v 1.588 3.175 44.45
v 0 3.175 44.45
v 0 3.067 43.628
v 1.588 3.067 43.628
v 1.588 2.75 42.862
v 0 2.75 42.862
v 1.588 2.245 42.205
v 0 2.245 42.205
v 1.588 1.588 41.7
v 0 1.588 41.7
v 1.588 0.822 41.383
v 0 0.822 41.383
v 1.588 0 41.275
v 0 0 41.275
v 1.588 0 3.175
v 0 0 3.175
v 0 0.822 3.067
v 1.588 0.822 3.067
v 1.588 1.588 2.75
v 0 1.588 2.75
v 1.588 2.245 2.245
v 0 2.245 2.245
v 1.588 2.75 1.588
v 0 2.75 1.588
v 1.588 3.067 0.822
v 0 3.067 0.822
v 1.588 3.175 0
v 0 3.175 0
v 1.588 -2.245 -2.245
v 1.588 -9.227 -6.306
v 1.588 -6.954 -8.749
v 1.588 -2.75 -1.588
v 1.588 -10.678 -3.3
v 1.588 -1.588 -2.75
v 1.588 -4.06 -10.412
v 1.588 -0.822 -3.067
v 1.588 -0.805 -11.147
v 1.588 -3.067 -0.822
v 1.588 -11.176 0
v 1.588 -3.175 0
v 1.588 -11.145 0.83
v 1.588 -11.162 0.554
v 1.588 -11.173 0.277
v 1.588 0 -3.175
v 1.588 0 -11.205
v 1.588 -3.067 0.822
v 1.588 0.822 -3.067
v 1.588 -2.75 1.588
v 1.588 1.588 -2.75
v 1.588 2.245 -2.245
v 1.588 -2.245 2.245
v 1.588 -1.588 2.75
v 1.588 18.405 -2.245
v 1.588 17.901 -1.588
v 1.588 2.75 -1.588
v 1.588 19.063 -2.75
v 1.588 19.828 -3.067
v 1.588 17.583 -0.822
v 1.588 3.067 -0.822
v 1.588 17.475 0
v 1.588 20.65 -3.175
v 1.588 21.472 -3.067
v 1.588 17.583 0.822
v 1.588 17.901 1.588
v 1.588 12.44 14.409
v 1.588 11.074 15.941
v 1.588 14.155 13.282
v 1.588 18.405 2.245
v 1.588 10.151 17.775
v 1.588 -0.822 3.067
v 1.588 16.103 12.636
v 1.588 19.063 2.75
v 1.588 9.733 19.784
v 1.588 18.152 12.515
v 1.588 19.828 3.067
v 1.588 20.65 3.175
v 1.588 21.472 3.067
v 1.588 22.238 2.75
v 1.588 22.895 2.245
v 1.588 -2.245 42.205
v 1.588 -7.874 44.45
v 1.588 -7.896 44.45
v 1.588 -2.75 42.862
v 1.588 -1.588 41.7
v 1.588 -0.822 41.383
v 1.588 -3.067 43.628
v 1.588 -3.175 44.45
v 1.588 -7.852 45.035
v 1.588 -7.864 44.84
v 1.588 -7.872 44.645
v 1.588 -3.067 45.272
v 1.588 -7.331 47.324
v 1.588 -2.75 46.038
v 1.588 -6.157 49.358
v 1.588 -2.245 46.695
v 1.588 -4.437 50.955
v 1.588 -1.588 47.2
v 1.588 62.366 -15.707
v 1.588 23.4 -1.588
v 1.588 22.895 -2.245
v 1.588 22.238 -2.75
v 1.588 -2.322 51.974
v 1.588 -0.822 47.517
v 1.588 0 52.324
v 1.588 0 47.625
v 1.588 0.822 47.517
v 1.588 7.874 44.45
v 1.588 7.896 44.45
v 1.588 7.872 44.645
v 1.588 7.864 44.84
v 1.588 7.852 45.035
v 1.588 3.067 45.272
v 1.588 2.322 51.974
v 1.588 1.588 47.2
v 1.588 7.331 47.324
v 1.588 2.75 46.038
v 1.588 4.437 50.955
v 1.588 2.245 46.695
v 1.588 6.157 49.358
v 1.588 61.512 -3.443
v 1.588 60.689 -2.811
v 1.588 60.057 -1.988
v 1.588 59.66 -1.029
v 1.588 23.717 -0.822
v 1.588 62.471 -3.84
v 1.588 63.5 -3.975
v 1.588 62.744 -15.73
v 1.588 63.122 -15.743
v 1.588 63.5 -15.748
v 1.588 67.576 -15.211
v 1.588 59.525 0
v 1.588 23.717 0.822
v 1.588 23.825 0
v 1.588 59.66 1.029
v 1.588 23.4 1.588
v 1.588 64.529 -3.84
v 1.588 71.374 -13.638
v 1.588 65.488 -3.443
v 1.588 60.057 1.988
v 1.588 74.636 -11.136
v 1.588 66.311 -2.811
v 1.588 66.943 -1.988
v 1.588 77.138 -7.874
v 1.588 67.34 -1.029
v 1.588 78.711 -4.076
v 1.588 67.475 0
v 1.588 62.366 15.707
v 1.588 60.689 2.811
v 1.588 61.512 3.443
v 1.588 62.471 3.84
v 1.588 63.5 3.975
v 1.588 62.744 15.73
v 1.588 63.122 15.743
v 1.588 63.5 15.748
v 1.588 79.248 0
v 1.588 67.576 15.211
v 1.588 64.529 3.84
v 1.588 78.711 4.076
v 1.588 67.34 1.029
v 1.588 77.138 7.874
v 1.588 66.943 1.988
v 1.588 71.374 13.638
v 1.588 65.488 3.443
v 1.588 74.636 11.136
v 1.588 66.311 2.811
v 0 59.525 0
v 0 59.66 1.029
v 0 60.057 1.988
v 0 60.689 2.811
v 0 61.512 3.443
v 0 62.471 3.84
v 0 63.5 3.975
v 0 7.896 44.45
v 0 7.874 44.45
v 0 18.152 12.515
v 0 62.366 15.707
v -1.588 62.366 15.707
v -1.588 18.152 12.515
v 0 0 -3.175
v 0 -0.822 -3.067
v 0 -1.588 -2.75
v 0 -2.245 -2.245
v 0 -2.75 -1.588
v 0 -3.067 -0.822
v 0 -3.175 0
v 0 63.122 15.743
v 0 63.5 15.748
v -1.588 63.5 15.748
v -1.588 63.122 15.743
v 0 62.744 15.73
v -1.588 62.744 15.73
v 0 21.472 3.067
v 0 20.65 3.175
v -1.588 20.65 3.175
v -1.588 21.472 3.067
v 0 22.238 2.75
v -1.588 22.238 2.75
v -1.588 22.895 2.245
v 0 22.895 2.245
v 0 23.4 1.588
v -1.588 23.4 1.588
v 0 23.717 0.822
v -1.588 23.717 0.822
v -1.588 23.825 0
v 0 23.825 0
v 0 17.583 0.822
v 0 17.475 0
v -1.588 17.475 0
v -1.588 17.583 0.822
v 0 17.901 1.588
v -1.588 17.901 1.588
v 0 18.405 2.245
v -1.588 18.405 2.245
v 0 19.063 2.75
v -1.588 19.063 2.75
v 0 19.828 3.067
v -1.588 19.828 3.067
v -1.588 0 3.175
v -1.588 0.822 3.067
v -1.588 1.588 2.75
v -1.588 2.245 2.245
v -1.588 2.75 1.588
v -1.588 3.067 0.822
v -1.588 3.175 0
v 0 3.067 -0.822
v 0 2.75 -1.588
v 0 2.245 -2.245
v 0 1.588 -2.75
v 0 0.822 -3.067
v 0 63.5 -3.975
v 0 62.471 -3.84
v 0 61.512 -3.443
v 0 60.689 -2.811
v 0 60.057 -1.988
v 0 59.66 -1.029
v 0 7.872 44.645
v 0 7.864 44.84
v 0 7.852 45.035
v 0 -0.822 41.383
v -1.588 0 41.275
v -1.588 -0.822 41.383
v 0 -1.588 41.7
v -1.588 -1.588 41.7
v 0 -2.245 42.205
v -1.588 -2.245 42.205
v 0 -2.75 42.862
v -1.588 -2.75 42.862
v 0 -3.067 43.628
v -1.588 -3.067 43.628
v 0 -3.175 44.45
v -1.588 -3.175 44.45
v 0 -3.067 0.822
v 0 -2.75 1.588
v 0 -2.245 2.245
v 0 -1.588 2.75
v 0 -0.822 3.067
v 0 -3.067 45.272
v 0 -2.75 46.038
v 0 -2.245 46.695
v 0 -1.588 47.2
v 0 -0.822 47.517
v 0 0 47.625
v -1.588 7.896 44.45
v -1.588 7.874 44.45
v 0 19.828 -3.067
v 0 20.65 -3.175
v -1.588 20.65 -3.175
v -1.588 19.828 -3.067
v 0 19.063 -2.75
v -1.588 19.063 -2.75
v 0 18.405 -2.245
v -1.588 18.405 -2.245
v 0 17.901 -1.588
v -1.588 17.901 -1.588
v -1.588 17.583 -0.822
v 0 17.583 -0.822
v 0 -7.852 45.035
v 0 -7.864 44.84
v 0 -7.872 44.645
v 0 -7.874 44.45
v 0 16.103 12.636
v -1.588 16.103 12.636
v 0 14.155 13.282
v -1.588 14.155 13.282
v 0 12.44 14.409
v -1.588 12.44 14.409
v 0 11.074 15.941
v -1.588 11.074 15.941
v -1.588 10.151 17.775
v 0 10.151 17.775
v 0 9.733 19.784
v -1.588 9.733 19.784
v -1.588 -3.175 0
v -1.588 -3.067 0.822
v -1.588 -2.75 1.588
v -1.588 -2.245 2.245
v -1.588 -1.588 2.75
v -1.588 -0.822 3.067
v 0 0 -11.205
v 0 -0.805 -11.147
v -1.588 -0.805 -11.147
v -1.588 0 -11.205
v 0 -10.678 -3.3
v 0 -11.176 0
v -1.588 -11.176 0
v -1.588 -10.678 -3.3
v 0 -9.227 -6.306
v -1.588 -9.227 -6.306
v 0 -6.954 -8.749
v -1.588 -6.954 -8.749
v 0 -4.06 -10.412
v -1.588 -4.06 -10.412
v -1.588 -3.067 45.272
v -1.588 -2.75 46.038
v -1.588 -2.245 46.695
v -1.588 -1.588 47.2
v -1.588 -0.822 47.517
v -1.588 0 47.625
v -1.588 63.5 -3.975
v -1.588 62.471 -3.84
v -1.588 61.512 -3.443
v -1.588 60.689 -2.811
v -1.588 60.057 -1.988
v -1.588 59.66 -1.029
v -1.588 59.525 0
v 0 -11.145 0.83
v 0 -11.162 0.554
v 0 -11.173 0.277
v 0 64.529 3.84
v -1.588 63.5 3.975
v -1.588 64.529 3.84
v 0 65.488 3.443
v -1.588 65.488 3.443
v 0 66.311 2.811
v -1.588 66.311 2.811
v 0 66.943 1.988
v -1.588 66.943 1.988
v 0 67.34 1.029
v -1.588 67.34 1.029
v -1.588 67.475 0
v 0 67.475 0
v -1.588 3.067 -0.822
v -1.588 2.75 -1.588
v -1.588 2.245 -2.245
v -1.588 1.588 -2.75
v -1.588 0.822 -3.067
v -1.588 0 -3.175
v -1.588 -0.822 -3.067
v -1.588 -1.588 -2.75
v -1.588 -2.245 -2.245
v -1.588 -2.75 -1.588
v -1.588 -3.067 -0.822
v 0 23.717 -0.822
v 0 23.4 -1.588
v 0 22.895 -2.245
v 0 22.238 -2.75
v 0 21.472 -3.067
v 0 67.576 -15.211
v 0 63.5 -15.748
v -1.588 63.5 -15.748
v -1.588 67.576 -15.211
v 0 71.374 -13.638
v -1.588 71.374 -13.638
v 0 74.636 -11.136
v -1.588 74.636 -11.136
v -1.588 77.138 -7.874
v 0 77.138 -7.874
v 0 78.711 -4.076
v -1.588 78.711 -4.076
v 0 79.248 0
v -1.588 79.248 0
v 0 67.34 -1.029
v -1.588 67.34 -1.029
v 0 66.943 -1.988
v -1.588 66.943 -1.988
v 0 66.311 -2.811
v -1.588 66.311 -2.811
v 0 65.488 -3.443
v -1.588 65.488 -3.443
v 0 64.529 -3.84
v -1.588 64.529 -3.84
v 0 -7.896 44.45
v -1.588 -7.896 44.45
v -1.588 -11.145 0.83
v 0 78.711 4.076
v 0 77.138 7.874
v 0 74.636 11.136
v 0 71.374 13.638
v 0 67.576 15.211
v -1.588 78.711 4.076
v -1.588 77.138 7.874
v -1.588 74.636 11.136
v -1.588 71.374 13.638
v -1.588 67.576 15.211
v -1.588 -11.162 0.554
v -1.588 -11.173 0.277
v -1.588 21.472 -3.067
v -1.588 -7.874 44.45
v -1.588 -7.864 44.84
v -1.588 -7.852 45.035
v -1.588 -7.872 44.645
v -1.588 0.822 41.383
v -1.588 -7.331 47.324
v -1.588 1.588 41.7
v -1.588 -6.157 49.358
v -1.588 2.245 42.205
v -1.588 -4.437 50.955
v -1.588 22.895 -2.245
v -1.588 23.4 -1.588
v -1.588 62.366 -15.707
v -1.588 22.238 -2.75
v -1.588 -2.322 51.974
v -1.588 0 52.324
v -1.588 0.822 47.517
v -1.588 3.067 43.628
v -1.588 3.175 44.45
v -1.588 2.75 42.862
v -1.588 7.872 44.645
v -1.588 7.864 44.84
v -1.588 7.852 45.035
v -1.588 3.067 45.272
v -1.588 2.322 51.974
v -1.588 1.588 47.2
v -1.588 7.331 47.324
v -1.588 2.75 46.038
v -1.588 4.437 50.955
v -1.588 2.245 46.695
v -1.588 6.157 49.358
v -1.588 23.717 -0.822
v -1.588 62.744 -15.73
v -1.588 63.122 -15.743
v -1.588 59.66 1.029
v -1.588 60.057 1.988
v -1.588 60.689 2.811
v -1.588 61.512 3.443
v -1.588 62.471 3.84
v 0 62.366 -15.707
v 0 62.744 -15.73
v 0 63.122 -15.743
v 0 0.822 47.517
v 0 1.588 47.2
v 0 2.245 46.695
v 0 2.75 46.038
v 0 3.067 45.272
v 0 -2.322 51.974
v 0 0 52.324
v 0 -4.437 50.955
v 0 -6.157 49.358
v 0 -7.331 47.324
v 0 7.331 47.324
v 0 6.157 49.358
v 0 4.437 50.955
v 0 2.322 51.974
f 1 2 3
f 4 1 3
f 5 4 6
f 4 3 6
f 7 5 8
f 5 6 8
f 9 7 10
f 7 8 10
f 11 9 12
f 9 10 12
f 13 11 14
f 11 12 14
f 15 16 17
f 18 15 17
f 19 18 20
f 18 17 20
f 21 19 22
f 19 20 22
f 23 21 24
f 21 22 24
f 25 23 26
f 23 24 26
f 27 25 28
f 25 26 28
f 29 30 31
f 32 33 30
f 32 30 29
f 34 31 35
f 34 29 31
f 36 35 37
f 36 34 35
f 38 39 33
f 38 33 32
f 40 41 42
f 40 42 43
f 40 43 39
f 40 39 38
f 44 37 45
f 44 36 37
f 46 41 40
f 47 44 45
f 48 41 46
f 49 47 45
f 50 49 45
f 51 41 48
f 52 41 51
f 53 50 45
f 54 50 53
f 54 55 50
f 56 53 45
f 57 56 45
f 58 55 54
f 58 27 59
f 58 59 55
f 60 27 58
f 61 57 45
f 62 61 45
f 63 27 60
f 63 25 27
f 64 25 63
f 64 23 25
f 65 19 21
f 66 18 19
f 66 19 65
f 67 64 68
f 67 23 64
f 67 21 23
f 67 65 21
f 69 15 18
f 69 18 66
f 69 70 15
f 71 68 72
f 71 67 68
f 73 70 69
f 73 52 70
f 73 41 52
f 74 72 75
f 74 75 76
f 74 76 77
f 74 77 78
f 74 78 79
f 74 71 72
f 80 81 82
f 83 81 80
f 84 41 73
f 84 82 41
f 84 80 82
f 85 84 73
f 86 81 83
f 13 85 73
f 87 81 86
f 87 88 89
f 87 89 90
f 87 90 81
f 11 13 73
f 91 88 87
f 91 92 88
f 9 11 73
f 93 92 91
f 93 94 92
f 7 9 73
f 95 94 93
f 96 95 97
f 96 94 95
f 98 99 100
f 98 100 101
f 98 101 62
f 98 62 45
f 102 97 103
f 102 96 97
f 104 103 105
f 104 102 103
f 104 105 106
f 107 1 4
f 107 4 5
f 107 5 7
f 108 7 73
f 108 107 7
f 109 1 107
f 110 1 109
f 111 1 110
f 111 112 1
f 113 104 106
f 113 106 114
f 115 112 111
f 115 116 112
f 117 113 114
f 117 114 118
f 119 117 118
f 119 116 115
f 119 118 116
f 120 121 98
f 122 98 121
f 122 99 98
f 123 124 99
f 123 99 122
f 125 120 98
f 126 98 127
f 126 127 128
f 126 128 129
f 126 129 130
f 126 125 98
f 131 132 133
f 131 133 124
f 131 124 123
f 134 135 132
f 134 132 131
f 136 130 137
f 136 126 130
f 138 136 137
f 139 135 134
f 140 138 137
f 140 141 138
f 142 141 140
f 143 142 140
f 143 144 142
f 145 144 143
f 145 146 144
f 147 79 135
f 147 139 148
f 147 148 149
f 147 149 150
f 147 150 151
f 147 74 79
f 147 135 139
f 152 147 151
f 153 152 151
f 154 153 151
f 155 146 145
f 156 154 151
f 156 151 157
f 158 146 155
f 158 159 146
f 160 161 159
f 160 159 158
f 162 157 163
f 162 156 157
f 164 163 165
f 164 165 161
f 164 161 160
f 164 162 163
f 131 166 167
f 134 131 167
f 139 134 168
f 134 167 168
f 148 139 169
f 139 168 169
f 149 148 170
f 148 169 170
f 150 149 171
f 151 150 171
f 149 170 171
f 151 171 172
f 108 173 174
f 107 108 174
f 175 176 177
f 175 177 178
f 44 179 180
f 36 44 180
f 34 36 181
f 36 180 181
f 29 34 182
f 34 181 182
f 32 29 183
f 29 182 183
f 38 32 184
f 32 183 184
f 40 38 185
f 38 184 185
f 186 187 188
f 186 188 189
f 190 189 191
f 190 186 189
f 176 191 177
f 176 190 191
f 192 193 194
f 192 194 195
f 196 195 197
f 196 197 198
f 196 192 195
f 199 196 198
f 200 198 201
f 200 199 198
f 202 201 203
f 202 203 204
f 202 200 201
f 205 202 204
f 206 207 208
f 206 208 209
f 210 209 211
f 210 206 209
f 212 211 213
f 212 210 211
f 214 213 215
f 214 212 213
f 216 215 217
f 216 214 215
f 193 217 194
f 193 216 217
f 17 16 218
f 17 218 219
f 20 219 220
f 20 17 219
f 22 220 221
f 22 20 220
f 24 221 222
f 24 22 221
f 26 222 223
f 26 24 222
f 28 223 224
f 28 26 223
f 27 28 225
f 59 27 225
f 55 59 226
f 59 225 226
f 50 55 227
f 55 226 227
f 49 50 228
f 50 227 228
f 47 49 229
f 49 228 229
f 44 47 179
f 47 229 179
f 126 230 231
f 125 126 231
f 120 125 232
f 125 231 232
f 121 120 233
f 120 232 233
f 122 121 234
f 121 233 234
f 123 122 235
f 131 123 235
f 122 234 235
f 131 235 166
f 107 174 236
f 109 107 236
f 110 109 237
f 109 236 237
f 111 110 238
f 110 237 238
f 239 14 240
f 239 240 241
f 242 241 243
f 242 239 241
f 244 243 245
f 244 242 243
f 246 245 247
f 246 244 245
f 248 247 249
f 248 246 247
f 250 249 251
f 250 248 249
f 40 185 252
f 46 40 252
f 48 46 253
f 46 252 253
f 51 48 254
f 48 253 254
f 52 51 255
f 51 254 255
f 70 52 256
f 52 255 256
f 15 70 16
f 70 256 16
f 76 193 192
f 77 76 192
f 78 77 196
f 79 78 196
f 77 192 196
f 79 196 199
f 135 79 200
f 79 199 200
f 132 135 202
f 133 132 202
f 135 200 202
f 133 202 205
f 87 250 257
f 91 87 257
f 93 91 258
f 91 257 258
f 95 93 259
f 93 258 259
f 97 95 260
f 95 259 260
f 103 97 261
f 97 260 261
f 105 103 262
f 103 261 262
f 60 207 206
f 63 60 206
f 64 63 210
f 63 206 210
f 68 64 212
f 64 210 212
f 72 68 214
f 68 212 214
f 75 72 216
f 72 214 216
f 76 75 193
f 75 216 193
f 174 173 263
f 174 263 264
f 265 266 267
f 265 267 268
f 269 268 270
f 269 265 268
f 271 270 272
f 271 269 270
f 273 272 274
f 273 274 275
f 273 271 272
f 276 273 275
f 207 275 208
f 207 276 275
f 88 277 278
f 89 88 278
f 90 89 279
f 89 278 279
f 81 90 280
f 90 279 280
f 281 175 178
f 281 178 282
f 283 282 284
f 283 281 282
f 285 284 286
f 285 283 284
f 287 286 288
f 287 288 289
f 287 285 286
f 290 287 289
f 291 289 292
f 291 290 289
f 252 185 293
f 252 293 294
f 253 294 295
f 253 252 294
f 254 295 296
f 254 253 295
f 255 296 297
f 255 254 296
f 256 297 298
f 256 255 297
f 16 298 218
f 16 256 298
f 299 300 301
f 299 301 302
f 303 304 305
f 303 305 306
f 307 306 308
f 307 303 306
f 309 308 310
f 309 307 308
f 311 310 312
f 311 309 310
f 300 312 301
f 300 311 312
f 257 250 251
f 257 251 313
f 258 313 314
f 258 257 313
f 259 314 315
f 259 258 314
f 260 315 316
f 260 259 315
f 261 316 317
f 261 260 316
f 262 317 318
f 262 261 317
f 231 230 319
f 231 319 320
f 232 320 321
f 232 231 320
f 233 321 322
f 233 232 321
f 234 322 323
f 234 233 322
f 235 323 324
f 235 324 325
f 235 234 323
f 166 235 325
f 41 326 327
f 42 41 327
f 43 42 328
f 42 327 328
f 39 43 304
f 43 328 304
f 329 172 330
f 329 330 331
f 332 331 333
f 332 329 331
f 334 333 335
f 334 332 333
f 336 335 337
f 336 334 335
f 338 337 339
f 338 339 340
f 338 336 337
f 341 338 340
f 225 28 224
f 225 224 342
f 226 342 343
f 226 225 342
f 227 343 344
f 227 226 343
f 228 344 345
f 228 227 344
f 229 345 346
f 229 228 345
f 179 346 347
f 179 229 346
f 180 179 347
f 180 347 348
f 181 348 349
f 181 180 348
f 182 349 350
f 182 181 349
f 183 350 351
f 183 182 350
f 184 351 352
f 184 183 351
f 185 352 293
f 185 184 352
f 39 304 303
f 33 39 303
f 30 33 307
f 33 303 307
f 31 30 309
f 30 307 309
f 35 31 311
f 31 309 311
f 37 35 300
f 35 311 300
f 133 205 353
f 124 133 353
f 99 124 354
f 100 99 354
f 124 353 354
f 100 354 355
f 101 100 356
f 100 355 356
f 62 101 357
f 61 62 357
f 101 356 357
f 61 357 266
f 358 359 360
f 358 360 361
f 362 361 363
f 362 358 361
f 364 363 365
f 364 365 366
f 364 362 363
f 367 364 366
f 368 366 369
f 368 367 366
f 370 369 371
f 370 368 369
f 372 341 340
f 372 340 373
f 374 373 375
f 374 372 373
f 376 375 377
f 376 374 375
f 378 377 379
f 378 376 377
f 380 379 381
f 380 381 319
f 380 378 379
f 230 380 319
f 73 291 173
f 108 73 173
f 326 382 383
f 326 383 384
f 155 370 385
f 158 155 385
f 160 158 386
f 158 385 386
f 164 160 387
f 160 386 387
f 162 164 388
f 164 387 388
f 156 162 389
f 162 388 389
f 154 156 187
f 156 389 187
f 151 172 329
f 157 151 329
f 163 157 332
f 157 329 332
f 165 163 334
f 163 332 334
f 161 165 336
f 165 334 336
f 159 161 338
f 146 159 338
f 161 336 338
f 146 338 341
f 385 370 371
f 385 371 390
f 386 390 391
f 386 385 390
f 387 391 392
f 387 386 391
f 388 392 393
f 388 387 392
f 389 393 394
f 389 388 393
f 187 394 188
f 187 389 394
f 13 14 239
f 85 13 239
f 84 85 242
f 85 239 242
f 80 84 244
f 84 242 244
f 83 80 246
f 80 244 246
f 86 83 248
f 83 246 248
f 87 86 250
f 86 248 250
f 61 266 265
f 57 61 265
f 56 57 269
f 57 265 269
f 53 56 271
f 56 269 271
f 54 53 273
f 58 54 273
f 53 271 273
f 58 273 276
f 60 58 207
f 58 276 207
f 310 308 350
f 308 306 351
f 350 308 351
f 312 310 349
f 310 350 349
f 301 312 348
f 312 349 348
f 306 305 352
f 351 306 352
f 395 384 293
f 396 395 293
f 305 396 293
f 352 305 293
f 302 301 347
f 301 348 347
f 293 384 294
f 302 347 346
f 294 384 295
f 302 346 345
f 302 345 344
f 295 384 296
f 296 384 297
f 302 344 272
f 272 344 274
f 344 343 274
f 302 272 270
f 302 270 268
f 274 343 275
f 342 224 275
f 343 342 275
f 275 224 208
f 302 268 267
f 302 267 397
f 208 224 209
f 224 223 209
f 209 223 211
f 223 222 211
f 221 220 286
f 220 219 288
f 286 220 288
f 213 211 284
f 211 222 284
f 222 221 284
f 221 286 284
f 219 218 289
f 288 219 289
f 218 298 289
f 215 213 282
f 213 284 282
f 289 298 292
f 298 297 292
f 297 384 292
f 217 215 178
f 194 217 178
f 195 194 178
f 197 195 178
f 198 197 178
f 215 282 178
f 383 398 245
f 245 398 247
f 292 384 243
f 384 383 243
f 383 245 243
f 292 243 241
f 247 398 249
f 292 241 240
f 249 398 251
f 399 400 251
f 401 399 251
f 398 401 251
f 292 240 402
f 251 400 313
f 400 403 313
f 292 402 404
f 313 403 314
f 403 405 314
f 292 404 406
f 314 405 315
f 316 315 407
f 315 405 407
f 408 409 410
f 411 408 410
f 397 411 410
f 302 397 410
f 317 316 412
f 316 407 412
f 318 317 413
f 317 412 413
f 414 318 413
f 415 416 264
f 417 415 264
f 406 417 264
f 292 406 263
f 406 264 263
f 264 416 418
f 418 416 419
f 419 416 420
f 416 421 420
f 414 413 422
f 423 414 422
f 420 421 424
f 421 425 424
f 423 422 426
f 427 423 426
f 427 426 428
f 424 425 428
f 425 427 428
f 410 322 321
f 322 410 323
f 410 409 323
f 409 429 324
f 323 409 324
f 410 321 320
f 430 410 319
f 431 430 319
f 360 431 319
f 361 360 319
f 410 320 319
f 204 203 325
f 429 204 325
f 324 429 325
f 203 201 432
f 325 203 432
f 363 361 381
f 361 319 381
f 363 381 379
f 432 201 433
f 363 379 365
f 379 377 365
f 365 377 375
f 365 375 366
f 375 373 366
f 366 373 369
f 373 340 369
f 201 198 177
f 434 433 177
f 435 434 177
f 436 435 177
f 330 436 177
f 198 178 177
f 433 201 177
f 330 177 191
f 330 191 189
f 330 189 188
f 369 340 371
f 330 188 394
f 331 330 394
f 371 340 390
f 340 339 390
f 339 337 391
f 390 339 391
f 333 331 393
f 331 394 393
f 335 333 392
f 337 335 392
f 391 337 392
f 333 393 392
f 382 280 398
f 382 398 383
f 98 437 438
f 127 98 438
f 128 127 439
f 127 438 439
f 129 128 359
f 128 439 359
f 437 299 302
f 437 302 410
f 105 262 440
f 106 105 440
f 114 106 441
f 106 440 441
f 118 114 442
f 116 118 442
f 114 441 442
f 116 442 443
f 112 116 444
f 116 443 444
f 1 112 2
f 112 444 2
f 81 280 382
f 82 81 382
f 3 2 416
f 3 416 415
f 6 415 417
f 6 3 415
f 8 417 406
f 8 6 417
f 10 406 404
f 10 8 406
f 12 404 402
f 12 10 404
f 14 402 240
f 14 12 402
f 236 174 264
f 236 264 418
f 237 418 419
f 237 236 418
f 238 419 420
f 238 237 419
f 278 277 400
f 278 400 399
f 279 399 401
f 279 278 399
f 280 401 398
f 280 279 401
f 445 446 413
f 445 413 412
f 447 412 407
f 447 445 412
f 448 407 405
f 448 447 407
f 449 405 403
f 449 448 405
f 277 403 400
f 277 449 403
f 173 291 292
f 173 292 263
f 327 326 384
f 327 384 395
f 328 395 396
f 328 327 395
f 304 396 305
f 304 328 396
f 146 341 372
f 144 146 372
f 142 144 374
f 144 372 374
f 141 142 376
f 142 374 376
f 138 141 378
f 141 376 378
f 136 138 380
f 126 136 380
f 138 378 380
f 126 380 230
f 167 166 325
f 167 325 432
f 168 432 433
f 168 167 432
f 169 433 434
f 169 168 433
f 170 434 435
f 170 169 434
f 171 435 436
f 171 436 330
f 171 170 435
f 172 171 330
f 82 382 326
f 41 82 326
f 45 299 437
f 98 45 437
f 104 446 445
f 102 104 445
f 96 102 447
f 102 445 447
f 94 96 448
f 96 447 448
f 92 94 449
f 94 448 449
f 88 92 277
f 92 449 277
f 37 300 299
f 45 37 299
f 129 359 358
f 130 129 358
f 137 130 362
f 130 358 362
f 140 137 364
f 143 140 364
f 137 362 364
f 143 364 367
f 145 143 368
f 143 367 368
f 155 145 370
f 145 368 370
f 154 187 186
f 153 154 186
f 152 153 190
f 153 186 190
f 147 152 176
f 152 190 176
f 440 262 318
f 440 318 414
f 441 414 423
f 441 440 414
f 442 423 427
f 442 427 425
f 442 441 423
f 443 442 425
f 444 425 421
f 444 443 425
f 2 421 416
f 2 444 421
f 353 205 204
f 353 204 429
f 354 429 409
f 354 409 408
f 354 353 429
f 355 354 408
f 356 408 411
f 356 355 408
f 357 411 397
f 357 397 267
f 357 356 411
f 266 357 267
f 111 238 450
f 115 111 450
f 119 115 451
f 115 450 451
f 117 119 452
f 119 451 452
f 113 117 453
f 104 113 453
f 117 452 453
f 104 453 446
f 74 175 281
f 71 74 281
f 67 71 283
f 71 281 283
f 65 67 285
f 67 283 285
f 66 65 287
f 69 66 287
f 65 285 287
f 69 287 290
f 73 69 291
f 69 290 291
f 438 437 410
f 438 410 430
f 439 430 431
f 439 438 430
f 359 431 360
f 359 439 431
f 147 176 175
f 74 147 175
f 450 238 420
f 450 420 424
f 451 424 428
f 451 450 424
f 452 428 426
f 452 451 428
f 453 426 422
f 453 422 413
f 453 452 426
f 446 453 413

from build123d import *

# Parameters (mm, degrees)
F1_DEPTH = 1.5875


with BuildPart() as f1:
    # F0 (on Right) → F1 (new body, symmetric)
    with BuildSketch(Plane.YZ):
        with BuildLine():
            Line((0, 41.275), (0, 3.175))
            ThreePointArc((0, 3.175), (2.2450640303, 2.2450640303), (3.175, 0))
            Line((3.175, 0), (17.4752, 0))
            ThreePointArc((17.4752, 0), (18.4051359697, 2.2450640303), (20.6502, 3.175))
            ThreePointArc((20.6502, 3.175), (22.8952640303, 2.2450640303), (23.8252, 0))
            Line((23.8252, 0), (59.5249, 0))
            ThreePointArc((59.5249, 0), (60.6891798341, 2.8108201659), (63.5, 3.9751))
            Line((63.5, 3.9751), (63.5, 15.748))
            ThreePointArc((63.5, 15.748), (62.9327037949, 15.7377787192), (62.366144, 15.7071281452))
            Line((62.366144, 15.7071281452), (18.1523895677, 12.515454258))
            ThreePointArc((18.1523895677, 12.515454258), (12.4398582326, 14.4089308884), (9.7332174357, 19.7840926163))
            Line((9.7332174357, 19.7840926163), (7.895816146, 44.45))
            Line((7.895816146, 44.45), (7.874, 44.45))
            Line((7.874, 44.45), (3.175, 44.45))
            ThreePointArc((3.175, 44.45), (2.2450640303, 42.2049359697), (0, 41.275))
        make_face()
        with BuildLine():
            Line((67.4751, 0), (79.248, 0))
            ThreePointArc((79.248, 0), (74.6355175901, 11.1355175901), (63.5, 15.748))
            Line((63.5, 15.748), (63.5, 3.9751))
            ThreePointArc((63.5, 3.9751), (66.3108201659, 2.8108201659), (67.4751, 0))
        make_face()
        with BuildLine():
            Line((63.5, -3.9751), (63.5, -15.748))
            ThreePointArc((63.5, -15.748), (74.6355175901, -11.1355175901), (79.248, 0))
            Line((79.248, 0), (67.4751, 0))
            ThreePointArc((67.4751, 0), (66.3108201659, -2.8108201659), (63.5, -3.9751))
        make_face()
        with BuildLine():
            ThreePointArc((3.175, 0), (2.2450640303, -2.2450640303), (0, -3.175))
            Line((0, -3.175), (0, -11.2050813091))
            Line((0, -11.2050813091), (62.366144, -15.7071281452))
            ThreePointArc((62.366144, -15.7071281452), (62.9327037949, -15.7377787192), (63.5, -15.748))
            Line((63.5, -15.748), (63.5, -3.9751))
            ThreePointArc((63.5, -3.9751), (60.6891798341, -2.8108201659), (59.5249, 0))
            Line((59.5249, 0), (23.8252, 0))
            ThreePointArc((23.8252, 0), (22.8952640303, -2.2450640303), (20.6502, -3.175))
            ThreePointArc((20.6502, -3.175), (18.4051359697, -2.2450640303), (17.4752, 0))
            Line((17.4752, 0), (3.175, 0))
        make_face()
        with BuildLine():
            ThreePointArc((-11.1451207035, 0.8302171429), (-11.1682775078, 0.4153956052), (-11.176, 0))
            Line((-11.176, 0), (-3.175, 0))
            ThreePointArc((-3.175, 0), (-2.2450640303, 2.2450640303), (0, 3.175))
            Line((0, 3.175), (0, 41.275))
            ThreePointArc((0, 41.275), (-2.2450640303, 42.2049359697), (-3.175, 44.45))
            Line((-3.175, 44.45), (-7.874, 44.45))
            Line((-7.874, 44.45), (-7.895816146, 44.45))
            Line((-7.895816146, 44.45), (-11.1451207035, 0.8302171429))
        make_face()
        with BuildLine():
            Line((-3.175, 0), (-11.176, 0))
            ThreePointArc((-11.176, 0), (-8.1821754525, -7.612816881), (-0.804672, -11.1469941676))
            Line((-0.804672, -11.1469941676), (0, -11.2050813091))
            Line((0, -11.2050813091), (0, -3.175))
            ThreePointArc((0, -3.175), (-2.2450640303, -2.2450640303), (-3.175, 0))
        make_face()
        with BuildLine():
            ThreePointArc((0, 47.625), (2.2450640303, 46.6950640303), (3.175, 44.45))
            Line((3.175, 44.45), (7.874, 44.45))
            ThreePointArc((7.874, 44.45), (7.8685591532, 44.7426650855), (7.852244132, 45.0349257143))
            ThreePointArc((7.852244132, 45.0349257143), (5.3569660689, 50.220857002), (0, 52.324))
            Line((0, 52.324), (0, 47.625))
        make_face()
        with BuildLine():
            ThreePointArc((-7.852244132, 45.0349257143), (-7.8685591532, 44.7426650855), (-7.874, 44.45))
            Line((-7.874, 44.45), (-3.175, 44.45))
            ThreePointArc((-3.175, 44.45), (-2.2450640303, 46.6950640303), (0, 47.625))
            Line((0, 47.625), (0, 52.324))
            ThreePointArc((0, 52.324), (-5.3569660689, 50.220857002), (-7.852244132, 45.0349257143))
        make_face()
    extrude(amount=F1_DEPTH, both=True)


solid = f1.part
